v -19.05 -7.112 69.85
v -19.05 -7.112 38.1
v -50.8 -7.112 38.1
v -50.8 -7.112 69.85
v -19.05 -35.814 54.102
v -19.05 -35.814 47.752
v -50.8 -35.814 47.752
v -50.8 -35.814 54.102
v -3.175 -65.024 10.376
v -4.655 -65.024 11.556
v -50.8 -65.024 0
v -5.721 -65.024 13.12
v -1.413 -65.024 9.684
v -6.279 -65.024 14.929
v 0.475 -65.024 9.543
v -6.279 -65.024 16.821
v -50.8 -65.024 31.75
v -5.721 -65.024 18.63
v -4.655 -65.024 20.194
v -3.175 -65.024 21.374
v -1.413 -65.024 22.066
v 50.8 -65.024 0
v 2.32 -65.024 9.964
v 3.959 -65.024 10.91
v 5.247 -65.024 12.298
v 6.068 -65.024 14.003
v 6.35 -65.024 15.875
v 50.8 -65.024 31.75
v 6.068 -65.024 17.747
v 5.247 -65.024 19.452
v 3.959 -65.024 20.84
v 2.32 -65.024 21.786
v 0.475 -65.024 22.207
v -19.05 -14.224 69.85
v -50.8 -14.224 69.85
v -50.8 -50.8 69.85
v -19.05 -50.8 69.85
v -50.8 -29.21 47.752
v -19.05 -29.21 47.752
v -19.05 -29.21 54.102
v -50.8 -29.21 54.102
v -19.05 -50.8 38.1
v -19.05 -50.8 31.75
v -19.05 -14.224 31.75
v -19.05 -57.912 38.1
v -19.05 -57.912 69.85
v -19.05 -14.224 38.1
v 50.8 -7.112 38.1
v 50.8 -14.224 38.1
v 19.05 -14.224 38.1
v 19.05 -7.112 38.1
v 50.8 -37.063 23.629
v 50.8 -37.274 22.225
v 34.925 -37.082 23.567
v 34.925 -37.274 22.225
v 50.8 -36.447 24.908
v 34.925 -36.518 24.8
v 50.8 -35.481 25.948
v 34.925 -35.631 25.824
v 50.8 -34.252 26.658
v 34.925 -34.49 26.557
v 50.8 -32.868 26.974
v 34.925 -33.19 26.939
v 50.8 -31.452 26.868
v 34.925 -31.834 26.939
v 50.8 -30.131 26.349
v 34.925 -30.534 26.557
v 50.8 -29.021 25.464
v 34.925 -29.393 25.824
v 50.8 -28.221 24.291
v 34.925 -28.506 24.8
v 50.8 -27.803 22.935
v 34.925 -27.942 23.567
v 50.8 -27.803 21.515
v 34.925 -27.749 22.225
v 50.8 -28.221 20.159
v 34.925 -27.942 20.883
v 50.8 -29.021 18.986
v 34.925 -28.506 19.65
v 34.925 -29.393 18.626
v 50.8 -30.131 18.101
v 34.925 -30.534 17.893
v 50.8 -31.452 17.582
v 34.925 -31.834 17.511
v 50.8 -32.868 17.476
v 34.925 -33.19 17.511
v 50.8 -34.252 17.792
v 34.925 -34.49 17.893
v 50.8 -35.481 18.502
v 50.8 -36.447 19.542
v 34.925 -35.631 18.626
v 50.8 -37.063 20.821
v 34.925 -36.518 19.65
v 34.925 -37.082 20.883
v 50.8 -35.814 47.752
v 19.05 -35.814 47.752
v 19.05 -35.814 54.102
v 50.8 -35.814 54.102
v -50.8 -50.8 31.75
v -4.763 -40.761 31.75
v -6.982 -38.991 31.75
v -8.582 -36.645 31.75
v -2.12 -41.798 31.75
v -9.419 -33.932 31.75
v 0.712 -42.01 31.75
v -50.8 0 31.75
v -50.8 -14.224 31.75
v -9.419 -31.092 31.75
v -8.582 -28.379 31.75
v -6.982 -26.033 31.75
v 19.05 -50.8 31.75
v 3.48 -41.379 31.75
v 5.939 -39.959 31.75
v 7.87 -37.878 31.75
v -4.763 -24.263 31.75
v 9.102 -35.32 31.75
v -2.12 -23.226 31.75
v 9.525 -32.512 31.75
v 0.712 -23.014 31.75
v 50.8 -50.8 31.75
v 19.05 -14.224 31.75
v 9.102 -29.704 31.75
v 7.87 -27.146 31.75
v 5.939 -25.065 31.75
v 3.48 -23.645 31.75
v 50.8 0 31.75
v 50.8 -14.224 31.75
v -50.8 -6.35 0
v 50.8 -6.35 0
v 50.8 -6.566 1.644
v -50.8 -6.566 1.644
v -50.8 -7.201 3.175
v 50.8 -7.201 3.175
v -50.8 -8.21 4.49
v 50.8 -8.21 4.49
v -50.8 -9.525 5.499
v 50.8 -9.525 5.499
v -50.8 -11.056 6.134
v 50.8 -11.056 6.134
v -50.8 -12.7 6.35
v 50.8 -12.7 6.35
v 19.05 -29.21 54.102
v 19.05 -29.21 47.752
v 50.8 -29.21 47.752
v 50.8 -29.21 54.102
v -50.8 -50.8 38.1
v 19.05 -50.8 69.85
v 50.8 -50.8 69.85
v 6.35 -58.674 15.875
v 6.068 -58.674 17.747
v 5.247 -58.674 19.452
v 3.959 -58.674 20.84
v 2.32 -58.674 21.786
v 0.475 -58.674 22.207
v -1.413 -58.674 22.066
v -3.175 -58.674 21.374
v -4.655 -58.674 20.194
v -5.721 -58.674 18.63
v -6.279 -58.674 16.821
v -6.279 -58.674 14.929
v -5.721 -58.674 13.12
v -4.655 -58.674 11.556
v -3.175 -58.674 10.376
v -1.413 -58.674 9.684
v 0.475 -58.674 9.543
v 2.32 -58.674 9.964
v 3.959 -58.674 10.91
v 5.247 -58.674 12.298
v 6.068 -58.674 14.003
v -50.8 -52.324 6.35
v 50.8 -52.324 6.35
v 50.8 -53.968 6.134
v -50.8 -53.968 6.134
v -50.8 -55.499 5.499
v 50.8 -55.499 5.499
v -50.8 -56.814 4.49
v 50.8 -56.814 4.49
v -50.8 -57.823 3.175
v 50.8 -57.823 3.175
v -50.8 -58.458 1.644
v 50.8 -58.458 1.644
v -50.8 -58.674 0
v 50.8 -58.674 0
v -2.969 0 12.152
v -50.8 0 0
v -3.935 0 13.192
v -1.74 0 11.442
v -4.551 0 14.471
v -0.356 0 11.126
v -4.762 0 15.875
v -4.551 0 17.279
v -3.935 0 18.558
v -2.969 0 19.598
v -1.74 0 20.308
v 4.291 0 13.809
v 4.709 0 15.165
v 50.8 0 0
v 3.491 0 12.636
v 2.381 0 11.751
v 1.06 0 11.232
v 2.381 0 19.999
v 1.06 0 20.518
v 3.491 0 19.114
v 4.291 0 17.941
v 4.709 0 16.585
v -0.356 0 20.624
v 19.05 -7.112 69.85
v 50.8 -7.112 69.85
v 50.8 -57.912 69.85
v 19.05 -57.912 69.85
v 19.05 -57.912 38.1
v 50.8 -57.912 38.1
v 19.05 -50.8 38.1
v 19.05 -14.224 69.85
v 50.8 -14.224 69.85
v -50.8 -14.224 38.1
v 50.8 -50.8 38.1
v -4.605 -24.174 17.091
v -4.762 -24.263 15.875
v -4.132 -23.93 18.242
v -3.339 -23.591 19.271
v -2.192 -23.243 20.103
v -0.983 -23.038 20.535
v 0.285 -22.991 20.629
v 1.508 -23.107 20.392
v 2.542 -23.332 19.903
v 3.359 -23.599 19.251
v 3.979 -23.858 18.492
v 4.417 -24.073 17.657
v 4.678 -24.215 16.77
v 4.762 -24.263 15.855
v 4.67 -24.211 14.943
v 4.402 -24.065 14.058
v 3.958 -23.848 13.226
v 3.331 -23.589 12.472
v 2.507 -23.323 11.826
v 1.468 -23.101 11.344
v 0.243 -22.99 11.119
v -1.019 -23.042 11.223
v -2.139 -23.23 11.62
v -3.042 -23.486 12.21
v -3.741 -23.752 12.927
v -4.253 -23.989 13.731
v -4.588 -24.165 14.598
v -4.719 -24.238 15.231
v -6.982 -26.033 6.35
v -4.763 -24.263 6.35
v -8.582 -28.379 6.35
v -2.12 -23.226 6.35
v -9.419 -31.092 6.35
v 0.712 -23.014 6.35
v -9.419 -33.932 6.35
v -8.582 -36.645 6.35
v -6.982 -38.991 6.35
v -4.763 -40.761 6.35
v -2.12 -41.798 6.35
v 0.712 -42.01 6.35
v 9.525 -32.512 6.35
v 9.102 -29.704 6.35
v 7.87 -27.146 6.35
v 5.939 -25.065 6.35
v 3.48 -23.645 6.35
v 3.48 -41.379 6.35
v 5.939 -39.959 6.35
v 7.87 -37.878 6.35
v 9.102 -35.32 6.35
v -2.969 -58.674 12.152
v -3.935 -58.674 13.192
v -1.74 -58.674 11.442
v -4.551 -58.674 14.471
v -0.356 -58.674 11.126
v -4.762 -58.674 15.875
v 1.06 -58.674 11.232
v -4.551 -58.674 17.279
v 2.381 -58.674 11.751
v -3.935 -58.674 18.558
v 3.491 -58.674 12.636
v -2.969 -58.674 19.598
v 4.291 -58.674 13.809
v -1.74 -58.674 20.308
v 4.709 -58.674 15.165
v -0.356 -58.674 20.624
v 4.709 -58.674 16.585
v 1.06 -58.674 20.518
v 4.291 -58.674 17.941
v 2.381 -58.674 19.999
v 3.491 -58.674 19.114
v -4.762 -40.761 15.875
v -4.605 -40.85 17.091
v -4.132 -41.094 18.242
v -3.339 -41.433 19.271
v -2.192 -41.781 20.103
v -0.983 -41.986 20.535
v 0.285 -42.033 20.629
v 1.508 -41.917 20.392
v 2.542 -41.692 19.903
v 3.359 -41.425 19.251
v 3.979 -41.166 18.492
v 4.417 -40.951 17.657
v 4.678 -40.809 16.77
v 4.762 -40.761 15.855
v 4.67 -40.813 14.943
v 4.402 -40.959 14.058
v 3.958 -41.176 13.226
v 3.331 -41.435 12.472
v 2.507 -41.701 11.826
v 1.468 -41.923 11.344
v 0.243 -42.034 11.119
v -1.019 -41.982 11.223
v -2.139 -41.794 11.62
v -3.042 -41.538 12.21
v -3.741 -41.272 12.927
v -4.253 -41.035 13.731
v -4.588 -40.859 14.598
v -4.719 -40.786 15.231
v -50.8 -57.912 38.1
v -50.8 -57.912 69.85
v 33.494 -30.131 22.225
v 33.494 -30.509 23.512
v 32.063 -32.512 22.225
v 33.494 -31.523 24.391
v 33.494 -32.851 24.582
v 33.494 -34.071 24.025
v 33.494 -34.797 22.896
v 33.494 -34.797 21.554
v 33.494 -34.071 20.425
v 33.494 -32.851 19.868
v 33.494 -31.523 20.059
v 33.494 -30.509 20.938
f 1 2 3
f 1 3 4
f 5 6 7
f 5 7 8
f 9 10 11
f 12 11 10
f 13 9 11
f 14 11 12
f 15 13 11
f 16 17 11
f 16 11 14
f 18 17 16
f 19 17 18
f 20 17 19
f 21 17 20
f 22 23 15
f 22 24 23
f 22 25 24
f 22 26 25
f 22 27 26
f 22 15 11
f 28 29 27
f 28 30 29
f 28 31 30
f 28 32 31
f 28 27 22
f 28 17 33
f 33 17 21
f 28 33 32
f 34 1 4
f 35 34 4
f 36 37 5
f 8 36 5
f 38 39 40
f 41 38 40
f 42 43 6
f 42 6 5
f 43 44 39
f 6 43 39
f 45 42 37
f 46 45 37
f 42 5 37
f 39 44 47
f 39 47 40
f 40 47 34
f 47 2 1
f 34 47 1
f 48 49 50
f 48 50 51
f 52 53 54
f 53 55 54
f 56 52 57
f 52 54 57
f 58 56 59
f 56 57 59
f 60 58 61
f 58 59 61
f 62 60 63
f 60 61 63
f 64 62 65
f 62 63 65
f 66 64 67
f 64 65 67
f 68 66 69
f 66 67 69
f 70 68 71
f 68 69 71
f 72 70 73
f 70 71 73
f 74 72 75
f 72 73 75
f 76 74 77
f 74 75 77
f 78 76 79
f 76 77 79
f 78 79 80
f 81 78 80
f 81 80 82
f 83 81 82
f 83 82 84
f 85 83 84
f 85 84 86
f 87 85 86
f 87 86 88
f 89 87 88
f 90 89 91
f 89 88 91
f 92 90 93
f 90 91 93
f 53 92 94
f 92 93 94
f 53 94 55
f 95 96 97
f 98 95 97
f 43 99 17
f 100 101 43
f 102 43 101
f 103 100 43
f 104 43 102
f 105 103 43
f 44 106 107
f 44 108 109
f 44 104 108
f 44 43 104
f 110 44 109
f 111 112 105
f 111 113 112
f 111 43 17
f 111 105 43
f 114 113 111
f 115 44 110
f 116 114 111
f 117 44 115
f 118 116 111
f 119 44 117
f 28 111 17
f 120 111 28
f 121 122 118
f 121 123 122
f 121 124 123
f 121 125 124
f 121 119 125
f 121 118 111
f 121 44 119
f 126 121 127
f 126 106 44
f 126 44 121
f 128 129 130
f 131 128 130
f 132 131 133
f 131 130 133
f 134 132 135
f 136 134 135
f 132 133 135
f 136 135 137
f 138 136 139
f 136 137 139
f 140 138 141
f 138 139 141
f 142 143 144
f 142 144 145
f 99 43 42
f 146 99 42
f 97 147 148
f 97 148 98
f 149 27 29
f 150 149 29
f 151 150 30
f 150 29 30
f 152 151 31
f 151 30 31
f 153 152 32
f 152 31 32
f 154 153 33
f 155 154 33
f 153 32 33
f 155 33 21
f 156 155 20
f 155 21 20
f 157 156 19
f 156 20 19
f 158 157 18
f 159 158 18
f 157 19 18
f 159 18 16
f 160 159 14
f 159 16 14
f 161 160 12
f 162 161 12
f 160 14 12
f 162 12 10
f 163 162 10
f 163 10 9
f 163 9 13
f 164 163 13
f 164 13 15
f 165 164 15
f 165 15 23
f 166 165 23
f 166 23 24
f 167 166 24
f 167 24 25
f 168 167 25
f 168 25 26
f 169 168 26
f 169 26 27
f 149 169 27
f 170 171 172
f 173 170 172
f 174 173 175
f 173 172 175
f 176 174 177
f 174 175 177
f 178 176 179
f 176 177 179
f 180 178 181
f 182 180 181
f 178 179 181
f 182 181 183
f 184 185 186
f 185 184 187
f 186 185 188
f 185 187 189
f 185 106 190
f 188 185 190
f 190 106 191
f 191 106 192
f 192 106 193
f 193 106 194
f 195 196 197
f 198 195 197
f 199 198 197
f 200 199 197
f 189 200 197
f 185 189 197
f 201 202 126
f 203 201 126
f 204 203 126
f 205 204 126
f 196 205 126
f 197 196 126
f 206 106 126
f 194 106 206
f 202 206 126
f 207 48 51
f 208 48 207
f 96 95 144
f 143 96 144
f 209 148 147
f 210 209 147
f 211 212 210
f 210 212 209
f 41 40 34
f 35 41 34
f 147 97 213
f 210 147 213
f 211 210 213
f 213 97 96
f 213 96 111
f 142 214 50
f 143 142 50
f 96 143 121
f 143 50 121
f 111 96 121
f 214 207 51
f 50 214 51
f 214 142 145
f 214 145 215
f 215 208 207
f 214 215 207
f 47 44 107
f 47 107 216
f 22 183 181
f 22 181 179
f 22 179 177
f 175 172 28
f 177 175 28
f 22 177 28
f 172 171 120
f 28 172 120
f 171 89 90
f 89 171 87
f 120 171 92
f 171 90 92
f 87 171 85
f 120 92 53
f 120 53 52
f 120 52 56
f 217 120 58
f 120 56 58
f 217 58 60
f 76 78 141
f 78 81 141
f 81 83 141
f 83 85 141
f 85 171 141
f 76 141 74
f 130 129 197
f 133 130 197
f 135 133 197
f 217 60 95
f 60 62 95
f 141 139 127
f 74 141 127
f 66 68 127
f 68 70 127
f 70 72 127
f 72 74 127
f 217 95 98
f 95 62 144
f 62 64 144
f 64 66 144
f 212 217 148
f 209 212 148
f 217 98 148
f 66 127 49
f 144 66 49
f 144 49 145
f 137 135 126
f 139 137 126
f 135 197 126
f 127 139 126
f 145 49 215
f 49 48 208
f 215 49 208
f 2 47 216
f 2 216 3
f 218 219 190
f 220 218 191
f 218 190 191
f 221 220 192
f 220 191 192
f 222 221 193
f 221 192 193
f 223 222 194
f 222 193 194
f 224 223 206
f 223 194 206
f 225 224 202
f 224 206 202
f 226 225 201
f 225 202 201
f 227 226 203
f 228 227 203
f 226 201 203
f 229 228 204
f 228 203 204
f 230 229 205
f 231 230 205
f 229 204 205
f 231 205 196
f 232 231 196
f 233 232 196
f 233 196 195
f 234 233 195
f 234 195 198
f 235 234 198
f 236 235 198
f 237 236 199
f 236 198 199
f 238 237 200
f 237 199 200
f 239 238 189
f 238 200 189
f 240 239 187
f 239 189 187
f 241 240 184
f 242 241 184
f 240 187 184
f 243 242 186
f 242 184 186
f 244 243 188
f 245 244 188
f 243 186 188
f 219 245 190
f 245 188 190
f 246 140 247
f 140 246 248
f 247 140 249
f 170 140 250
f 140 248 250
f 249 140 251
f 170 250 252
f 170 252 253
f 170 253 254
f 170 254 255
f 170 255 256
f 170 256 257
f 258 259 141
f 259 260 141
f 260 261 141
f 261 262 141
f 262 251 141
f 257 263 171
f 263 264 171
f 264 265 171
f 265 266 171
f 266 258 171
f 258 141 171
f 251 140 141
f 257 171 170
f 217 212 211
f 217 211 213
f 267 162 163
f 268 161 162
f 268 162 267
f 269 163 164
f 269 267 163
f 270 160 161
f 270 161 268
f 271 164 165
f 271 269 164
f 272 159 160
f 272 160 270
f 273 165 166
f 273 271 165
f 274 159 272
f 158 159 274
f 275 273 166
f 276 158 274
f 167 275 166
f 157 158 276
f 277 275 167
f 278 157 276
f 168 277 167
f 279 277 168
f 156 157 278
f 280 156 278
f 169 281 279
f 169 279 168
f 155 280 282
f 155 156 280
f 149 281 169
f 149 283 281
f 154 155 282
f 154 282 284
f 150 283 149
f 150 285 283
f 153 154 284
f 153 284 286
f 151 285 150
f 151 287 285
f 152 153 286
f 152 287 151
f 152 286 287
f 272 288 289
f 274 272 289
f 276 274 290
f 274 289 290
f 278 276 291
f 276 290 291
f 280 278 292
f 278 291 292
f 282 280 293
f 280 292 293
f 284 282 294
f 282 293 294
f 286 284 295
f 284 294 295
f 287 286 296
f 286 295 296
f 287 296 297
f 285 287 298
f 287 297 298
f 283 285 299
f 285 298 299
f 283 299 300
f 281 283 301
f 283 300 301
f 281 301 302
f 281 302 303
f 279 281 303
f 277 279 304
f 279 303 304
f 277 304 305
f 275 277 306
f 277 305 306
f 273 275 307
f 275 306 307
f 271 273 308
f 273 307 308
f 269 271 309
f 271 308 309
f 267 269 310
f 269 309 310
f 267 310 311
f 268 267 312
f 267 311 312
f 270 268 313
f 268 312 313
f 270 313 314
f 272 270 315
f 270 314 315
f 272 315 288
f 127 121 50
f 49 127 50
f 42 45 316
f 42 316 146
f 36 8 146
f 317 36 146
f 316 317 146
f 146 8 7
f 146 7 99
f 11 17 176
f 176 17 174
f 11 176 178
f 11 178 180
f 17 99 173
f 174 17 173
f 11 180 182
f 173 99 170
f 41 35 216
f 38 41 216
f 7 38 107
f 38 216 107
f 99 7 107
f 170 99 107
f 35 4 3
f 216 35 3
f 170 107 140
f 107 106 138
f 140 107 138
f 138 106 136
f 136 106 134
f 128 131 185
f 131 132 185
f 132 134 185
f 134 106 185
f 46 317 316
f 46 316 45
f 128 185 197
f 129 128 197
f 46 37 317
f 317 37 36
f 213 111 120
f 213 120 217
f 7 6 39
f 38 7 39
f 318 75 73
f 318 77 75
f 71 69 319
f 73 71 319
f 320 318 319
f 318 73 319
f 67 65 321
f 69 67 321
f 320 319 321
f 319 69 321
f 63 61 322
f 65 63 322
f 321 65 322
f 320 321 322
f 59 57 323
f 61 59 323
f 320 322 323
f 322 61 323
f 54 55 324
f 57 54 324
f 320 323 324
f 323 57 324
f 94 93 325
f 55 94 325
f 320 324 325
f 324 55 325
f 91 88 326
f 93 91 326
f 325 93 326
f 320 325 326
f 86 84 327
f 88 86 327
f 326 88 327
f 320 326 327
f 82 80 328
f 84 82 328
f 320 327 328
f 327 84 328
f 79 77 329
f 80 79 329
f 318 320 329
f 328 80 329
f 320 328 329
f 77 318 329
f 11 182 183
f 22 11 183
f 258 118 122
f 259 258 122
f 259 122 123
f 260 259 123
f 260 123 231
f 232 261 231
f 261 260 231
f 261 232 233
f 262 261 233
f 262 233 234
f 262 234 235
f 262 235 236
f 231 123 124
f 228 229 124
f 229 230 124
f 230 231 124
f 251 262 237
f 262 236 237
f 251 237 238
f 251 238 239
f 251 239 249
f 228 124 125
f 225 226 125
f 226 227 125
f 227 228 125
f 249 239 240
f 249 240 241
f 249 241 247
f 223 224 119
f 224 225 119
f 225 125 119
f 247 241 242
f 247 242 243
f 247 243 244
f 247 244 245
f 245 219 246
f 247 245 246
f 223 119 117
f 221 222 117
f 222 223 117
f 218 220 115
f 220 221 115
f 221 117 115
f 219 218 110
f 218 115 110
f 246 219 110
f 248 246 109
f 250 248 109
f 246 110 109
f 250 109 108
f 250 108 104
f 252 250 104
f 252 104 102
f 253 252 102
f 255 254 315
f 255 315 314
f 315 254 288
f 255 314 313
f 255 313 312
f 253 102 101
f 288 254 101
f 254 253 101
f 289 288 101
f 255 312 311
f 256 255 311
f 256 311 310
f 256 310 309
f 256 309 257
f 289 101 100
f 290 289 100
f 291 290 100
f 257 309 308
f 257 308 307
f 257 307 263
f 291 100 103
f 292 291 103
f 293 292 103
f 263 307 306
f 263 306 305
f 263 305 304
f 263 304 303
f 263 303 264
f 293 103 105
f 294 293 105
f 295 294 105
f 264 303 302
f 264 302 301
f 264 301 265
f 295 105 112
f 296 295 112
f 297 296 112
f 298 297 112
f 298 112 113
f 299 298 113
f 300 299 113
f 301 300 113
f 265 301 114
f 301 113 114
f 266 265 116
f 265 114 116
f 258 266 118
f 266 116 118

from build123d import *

# Parameters (mm, degrees)
F1_DEPTH       = 65.024
F3_D           = 9.525
F3_CBORE_D     = 12.7
F3_CBORE_DEPTH = 6.35
F4_W           = 31.75
F4_H           = 7.112
F5_DEPTH       = 38.1
F6_W           = 7.112
F6_H           = 38.1
F7_DEPTH       = 101.601
F9_DEPTH       = 101.601
F11_D          = 9.525
F11_DEPTH      = 15.875
F11_TIP        = 2.8615986981
F12_W          = 6.604
F12_H          = 6.35
F13_DEPTH      = 101.601
F15_DEPTH      = 101.601
F16_W          = 7.112
F16_H          = 6.35
F17_DEPTH      = 101.601
F18_R          = 9.525
F19_DEPTH      = 31.751


with BuildPart() as f1:
    # F0 (on Front) → F1 (new body)
    with BuildSketch(Plane.XZ):
        Polygon((-50.8, 69.85), (-50.8, 0), (50.8, 0), (50.8, 69.85), (19.05, 69.85), (19.05, 31.75), (-19.05, 31.75), (-19.05, 69.85), align=None)
    extrude(amount=F1_DEPTH)

    # F3 (through all)
    with Locations(Plane.XZ.offset(65.024)):
        with Locations((0, 15.875)):
            CounterBoreHole(F3_D / 2, F3_CBORE_D / 2, F3_CBORE_DEPTH)

    # F4 (on face) → F5 (cut)
    with BuildSketch(Plane.XY.offset(69.85)):
        with Locations((-34.925, -61.468)):
            Rectangle(F4_W, F4_H)
    extrude(amount=-F5_DEPTH, mode=Mode.SUBTRACT)

    # F6 (on face) → F7 (cut, through all)
    with BuildSketch(Plane.YZ.offset(50.8)):
        with Locations((-61.468, 50.8)):
            Rectangle(F6_W, F6_H)
        with Locations((-3.556, 50.8)):
            Rectangle(F6_W, F6_H)
    extrude(amount=-F7_DEPTH, mode=Mode.SUBTRACT)

    # F8 (on face) → F9 (cut, through all)
    with BuildSketch(Plane.YZ.offset(50.8)):
        with BuildLine():
            Line((-12.7, 6.35), (-52.324, 6.35))
            ThreePointArc((-52.324, 6.35), (-56.8141280605, 4.4901280605), (-58.674, 0))
            Line((-58.674, 0), (-6.35, 0))
            ThreePointArc((-6.35, 0), (-8.2098719395, 4.4901280605), (-12.7, 6.35))
        make_face()
    extrude(amount=-F9_DEPTH, mode=Mode.SUBTRACT)

    # F11
    with Locations(Plane.YZ.offset(50.8)):
        with Locations((-32.512, 22.225)):
            Hole(F11_D / 2, depth=F11_DEPTH)
            with Locations((0, 0, -(F11_DEPTH + F11_TIP / 2))):  # 118° drill point
                Cone(0, F11_D / 2, F11_TIP, mode=Mode.SUBTRACT)

    # F12 (on face) → F13 (cut, through all)
    with BuildSketch(Plane.YZ.offset(50.8)):
        with Locations((-32.512, 50.927)):
            Rectangle(F12_W, F12_H)
    extrude(amount=-F13_DEPTH, mode=Mode.SUBTRACT)

    # F14 (on face) → F15 (cut, through all)
    with BuildSketch(Plane.YZ.offset(50.8)):
        Polygon((-50.8, 69.85), (-35.814, 54.102), (-29.21, 54.102), (-14.224, 69.85), align=None)
    extrude(amount=-F15_DEPTH, mode=Mode.SUBTRACT)

    # F16 (on face) → F17 (cut, through all)
    with BuildSketch(Plane.YZ.offset(50.8)):
        with Locations((-10.668, 34.925)):
            Rectangle(F16_W, F16_H)
        with Locations((-54.356, 34.925)):
            Rectangle(F16_W, F16_H)
    extrude(amount=-F17_DEPTH, mode=Mode.SUBTRACT)

    # F18 (on face) → F19 (cut, through all)
    with BuildSketch(Plane.XY.offset(31.75)):
        with Locations((0, -32.512)):
            Circle(F18_R)
    extrude(amount=-F19_DEPTH, mode=Mode.SUBTRACT)


solid = f1.part
